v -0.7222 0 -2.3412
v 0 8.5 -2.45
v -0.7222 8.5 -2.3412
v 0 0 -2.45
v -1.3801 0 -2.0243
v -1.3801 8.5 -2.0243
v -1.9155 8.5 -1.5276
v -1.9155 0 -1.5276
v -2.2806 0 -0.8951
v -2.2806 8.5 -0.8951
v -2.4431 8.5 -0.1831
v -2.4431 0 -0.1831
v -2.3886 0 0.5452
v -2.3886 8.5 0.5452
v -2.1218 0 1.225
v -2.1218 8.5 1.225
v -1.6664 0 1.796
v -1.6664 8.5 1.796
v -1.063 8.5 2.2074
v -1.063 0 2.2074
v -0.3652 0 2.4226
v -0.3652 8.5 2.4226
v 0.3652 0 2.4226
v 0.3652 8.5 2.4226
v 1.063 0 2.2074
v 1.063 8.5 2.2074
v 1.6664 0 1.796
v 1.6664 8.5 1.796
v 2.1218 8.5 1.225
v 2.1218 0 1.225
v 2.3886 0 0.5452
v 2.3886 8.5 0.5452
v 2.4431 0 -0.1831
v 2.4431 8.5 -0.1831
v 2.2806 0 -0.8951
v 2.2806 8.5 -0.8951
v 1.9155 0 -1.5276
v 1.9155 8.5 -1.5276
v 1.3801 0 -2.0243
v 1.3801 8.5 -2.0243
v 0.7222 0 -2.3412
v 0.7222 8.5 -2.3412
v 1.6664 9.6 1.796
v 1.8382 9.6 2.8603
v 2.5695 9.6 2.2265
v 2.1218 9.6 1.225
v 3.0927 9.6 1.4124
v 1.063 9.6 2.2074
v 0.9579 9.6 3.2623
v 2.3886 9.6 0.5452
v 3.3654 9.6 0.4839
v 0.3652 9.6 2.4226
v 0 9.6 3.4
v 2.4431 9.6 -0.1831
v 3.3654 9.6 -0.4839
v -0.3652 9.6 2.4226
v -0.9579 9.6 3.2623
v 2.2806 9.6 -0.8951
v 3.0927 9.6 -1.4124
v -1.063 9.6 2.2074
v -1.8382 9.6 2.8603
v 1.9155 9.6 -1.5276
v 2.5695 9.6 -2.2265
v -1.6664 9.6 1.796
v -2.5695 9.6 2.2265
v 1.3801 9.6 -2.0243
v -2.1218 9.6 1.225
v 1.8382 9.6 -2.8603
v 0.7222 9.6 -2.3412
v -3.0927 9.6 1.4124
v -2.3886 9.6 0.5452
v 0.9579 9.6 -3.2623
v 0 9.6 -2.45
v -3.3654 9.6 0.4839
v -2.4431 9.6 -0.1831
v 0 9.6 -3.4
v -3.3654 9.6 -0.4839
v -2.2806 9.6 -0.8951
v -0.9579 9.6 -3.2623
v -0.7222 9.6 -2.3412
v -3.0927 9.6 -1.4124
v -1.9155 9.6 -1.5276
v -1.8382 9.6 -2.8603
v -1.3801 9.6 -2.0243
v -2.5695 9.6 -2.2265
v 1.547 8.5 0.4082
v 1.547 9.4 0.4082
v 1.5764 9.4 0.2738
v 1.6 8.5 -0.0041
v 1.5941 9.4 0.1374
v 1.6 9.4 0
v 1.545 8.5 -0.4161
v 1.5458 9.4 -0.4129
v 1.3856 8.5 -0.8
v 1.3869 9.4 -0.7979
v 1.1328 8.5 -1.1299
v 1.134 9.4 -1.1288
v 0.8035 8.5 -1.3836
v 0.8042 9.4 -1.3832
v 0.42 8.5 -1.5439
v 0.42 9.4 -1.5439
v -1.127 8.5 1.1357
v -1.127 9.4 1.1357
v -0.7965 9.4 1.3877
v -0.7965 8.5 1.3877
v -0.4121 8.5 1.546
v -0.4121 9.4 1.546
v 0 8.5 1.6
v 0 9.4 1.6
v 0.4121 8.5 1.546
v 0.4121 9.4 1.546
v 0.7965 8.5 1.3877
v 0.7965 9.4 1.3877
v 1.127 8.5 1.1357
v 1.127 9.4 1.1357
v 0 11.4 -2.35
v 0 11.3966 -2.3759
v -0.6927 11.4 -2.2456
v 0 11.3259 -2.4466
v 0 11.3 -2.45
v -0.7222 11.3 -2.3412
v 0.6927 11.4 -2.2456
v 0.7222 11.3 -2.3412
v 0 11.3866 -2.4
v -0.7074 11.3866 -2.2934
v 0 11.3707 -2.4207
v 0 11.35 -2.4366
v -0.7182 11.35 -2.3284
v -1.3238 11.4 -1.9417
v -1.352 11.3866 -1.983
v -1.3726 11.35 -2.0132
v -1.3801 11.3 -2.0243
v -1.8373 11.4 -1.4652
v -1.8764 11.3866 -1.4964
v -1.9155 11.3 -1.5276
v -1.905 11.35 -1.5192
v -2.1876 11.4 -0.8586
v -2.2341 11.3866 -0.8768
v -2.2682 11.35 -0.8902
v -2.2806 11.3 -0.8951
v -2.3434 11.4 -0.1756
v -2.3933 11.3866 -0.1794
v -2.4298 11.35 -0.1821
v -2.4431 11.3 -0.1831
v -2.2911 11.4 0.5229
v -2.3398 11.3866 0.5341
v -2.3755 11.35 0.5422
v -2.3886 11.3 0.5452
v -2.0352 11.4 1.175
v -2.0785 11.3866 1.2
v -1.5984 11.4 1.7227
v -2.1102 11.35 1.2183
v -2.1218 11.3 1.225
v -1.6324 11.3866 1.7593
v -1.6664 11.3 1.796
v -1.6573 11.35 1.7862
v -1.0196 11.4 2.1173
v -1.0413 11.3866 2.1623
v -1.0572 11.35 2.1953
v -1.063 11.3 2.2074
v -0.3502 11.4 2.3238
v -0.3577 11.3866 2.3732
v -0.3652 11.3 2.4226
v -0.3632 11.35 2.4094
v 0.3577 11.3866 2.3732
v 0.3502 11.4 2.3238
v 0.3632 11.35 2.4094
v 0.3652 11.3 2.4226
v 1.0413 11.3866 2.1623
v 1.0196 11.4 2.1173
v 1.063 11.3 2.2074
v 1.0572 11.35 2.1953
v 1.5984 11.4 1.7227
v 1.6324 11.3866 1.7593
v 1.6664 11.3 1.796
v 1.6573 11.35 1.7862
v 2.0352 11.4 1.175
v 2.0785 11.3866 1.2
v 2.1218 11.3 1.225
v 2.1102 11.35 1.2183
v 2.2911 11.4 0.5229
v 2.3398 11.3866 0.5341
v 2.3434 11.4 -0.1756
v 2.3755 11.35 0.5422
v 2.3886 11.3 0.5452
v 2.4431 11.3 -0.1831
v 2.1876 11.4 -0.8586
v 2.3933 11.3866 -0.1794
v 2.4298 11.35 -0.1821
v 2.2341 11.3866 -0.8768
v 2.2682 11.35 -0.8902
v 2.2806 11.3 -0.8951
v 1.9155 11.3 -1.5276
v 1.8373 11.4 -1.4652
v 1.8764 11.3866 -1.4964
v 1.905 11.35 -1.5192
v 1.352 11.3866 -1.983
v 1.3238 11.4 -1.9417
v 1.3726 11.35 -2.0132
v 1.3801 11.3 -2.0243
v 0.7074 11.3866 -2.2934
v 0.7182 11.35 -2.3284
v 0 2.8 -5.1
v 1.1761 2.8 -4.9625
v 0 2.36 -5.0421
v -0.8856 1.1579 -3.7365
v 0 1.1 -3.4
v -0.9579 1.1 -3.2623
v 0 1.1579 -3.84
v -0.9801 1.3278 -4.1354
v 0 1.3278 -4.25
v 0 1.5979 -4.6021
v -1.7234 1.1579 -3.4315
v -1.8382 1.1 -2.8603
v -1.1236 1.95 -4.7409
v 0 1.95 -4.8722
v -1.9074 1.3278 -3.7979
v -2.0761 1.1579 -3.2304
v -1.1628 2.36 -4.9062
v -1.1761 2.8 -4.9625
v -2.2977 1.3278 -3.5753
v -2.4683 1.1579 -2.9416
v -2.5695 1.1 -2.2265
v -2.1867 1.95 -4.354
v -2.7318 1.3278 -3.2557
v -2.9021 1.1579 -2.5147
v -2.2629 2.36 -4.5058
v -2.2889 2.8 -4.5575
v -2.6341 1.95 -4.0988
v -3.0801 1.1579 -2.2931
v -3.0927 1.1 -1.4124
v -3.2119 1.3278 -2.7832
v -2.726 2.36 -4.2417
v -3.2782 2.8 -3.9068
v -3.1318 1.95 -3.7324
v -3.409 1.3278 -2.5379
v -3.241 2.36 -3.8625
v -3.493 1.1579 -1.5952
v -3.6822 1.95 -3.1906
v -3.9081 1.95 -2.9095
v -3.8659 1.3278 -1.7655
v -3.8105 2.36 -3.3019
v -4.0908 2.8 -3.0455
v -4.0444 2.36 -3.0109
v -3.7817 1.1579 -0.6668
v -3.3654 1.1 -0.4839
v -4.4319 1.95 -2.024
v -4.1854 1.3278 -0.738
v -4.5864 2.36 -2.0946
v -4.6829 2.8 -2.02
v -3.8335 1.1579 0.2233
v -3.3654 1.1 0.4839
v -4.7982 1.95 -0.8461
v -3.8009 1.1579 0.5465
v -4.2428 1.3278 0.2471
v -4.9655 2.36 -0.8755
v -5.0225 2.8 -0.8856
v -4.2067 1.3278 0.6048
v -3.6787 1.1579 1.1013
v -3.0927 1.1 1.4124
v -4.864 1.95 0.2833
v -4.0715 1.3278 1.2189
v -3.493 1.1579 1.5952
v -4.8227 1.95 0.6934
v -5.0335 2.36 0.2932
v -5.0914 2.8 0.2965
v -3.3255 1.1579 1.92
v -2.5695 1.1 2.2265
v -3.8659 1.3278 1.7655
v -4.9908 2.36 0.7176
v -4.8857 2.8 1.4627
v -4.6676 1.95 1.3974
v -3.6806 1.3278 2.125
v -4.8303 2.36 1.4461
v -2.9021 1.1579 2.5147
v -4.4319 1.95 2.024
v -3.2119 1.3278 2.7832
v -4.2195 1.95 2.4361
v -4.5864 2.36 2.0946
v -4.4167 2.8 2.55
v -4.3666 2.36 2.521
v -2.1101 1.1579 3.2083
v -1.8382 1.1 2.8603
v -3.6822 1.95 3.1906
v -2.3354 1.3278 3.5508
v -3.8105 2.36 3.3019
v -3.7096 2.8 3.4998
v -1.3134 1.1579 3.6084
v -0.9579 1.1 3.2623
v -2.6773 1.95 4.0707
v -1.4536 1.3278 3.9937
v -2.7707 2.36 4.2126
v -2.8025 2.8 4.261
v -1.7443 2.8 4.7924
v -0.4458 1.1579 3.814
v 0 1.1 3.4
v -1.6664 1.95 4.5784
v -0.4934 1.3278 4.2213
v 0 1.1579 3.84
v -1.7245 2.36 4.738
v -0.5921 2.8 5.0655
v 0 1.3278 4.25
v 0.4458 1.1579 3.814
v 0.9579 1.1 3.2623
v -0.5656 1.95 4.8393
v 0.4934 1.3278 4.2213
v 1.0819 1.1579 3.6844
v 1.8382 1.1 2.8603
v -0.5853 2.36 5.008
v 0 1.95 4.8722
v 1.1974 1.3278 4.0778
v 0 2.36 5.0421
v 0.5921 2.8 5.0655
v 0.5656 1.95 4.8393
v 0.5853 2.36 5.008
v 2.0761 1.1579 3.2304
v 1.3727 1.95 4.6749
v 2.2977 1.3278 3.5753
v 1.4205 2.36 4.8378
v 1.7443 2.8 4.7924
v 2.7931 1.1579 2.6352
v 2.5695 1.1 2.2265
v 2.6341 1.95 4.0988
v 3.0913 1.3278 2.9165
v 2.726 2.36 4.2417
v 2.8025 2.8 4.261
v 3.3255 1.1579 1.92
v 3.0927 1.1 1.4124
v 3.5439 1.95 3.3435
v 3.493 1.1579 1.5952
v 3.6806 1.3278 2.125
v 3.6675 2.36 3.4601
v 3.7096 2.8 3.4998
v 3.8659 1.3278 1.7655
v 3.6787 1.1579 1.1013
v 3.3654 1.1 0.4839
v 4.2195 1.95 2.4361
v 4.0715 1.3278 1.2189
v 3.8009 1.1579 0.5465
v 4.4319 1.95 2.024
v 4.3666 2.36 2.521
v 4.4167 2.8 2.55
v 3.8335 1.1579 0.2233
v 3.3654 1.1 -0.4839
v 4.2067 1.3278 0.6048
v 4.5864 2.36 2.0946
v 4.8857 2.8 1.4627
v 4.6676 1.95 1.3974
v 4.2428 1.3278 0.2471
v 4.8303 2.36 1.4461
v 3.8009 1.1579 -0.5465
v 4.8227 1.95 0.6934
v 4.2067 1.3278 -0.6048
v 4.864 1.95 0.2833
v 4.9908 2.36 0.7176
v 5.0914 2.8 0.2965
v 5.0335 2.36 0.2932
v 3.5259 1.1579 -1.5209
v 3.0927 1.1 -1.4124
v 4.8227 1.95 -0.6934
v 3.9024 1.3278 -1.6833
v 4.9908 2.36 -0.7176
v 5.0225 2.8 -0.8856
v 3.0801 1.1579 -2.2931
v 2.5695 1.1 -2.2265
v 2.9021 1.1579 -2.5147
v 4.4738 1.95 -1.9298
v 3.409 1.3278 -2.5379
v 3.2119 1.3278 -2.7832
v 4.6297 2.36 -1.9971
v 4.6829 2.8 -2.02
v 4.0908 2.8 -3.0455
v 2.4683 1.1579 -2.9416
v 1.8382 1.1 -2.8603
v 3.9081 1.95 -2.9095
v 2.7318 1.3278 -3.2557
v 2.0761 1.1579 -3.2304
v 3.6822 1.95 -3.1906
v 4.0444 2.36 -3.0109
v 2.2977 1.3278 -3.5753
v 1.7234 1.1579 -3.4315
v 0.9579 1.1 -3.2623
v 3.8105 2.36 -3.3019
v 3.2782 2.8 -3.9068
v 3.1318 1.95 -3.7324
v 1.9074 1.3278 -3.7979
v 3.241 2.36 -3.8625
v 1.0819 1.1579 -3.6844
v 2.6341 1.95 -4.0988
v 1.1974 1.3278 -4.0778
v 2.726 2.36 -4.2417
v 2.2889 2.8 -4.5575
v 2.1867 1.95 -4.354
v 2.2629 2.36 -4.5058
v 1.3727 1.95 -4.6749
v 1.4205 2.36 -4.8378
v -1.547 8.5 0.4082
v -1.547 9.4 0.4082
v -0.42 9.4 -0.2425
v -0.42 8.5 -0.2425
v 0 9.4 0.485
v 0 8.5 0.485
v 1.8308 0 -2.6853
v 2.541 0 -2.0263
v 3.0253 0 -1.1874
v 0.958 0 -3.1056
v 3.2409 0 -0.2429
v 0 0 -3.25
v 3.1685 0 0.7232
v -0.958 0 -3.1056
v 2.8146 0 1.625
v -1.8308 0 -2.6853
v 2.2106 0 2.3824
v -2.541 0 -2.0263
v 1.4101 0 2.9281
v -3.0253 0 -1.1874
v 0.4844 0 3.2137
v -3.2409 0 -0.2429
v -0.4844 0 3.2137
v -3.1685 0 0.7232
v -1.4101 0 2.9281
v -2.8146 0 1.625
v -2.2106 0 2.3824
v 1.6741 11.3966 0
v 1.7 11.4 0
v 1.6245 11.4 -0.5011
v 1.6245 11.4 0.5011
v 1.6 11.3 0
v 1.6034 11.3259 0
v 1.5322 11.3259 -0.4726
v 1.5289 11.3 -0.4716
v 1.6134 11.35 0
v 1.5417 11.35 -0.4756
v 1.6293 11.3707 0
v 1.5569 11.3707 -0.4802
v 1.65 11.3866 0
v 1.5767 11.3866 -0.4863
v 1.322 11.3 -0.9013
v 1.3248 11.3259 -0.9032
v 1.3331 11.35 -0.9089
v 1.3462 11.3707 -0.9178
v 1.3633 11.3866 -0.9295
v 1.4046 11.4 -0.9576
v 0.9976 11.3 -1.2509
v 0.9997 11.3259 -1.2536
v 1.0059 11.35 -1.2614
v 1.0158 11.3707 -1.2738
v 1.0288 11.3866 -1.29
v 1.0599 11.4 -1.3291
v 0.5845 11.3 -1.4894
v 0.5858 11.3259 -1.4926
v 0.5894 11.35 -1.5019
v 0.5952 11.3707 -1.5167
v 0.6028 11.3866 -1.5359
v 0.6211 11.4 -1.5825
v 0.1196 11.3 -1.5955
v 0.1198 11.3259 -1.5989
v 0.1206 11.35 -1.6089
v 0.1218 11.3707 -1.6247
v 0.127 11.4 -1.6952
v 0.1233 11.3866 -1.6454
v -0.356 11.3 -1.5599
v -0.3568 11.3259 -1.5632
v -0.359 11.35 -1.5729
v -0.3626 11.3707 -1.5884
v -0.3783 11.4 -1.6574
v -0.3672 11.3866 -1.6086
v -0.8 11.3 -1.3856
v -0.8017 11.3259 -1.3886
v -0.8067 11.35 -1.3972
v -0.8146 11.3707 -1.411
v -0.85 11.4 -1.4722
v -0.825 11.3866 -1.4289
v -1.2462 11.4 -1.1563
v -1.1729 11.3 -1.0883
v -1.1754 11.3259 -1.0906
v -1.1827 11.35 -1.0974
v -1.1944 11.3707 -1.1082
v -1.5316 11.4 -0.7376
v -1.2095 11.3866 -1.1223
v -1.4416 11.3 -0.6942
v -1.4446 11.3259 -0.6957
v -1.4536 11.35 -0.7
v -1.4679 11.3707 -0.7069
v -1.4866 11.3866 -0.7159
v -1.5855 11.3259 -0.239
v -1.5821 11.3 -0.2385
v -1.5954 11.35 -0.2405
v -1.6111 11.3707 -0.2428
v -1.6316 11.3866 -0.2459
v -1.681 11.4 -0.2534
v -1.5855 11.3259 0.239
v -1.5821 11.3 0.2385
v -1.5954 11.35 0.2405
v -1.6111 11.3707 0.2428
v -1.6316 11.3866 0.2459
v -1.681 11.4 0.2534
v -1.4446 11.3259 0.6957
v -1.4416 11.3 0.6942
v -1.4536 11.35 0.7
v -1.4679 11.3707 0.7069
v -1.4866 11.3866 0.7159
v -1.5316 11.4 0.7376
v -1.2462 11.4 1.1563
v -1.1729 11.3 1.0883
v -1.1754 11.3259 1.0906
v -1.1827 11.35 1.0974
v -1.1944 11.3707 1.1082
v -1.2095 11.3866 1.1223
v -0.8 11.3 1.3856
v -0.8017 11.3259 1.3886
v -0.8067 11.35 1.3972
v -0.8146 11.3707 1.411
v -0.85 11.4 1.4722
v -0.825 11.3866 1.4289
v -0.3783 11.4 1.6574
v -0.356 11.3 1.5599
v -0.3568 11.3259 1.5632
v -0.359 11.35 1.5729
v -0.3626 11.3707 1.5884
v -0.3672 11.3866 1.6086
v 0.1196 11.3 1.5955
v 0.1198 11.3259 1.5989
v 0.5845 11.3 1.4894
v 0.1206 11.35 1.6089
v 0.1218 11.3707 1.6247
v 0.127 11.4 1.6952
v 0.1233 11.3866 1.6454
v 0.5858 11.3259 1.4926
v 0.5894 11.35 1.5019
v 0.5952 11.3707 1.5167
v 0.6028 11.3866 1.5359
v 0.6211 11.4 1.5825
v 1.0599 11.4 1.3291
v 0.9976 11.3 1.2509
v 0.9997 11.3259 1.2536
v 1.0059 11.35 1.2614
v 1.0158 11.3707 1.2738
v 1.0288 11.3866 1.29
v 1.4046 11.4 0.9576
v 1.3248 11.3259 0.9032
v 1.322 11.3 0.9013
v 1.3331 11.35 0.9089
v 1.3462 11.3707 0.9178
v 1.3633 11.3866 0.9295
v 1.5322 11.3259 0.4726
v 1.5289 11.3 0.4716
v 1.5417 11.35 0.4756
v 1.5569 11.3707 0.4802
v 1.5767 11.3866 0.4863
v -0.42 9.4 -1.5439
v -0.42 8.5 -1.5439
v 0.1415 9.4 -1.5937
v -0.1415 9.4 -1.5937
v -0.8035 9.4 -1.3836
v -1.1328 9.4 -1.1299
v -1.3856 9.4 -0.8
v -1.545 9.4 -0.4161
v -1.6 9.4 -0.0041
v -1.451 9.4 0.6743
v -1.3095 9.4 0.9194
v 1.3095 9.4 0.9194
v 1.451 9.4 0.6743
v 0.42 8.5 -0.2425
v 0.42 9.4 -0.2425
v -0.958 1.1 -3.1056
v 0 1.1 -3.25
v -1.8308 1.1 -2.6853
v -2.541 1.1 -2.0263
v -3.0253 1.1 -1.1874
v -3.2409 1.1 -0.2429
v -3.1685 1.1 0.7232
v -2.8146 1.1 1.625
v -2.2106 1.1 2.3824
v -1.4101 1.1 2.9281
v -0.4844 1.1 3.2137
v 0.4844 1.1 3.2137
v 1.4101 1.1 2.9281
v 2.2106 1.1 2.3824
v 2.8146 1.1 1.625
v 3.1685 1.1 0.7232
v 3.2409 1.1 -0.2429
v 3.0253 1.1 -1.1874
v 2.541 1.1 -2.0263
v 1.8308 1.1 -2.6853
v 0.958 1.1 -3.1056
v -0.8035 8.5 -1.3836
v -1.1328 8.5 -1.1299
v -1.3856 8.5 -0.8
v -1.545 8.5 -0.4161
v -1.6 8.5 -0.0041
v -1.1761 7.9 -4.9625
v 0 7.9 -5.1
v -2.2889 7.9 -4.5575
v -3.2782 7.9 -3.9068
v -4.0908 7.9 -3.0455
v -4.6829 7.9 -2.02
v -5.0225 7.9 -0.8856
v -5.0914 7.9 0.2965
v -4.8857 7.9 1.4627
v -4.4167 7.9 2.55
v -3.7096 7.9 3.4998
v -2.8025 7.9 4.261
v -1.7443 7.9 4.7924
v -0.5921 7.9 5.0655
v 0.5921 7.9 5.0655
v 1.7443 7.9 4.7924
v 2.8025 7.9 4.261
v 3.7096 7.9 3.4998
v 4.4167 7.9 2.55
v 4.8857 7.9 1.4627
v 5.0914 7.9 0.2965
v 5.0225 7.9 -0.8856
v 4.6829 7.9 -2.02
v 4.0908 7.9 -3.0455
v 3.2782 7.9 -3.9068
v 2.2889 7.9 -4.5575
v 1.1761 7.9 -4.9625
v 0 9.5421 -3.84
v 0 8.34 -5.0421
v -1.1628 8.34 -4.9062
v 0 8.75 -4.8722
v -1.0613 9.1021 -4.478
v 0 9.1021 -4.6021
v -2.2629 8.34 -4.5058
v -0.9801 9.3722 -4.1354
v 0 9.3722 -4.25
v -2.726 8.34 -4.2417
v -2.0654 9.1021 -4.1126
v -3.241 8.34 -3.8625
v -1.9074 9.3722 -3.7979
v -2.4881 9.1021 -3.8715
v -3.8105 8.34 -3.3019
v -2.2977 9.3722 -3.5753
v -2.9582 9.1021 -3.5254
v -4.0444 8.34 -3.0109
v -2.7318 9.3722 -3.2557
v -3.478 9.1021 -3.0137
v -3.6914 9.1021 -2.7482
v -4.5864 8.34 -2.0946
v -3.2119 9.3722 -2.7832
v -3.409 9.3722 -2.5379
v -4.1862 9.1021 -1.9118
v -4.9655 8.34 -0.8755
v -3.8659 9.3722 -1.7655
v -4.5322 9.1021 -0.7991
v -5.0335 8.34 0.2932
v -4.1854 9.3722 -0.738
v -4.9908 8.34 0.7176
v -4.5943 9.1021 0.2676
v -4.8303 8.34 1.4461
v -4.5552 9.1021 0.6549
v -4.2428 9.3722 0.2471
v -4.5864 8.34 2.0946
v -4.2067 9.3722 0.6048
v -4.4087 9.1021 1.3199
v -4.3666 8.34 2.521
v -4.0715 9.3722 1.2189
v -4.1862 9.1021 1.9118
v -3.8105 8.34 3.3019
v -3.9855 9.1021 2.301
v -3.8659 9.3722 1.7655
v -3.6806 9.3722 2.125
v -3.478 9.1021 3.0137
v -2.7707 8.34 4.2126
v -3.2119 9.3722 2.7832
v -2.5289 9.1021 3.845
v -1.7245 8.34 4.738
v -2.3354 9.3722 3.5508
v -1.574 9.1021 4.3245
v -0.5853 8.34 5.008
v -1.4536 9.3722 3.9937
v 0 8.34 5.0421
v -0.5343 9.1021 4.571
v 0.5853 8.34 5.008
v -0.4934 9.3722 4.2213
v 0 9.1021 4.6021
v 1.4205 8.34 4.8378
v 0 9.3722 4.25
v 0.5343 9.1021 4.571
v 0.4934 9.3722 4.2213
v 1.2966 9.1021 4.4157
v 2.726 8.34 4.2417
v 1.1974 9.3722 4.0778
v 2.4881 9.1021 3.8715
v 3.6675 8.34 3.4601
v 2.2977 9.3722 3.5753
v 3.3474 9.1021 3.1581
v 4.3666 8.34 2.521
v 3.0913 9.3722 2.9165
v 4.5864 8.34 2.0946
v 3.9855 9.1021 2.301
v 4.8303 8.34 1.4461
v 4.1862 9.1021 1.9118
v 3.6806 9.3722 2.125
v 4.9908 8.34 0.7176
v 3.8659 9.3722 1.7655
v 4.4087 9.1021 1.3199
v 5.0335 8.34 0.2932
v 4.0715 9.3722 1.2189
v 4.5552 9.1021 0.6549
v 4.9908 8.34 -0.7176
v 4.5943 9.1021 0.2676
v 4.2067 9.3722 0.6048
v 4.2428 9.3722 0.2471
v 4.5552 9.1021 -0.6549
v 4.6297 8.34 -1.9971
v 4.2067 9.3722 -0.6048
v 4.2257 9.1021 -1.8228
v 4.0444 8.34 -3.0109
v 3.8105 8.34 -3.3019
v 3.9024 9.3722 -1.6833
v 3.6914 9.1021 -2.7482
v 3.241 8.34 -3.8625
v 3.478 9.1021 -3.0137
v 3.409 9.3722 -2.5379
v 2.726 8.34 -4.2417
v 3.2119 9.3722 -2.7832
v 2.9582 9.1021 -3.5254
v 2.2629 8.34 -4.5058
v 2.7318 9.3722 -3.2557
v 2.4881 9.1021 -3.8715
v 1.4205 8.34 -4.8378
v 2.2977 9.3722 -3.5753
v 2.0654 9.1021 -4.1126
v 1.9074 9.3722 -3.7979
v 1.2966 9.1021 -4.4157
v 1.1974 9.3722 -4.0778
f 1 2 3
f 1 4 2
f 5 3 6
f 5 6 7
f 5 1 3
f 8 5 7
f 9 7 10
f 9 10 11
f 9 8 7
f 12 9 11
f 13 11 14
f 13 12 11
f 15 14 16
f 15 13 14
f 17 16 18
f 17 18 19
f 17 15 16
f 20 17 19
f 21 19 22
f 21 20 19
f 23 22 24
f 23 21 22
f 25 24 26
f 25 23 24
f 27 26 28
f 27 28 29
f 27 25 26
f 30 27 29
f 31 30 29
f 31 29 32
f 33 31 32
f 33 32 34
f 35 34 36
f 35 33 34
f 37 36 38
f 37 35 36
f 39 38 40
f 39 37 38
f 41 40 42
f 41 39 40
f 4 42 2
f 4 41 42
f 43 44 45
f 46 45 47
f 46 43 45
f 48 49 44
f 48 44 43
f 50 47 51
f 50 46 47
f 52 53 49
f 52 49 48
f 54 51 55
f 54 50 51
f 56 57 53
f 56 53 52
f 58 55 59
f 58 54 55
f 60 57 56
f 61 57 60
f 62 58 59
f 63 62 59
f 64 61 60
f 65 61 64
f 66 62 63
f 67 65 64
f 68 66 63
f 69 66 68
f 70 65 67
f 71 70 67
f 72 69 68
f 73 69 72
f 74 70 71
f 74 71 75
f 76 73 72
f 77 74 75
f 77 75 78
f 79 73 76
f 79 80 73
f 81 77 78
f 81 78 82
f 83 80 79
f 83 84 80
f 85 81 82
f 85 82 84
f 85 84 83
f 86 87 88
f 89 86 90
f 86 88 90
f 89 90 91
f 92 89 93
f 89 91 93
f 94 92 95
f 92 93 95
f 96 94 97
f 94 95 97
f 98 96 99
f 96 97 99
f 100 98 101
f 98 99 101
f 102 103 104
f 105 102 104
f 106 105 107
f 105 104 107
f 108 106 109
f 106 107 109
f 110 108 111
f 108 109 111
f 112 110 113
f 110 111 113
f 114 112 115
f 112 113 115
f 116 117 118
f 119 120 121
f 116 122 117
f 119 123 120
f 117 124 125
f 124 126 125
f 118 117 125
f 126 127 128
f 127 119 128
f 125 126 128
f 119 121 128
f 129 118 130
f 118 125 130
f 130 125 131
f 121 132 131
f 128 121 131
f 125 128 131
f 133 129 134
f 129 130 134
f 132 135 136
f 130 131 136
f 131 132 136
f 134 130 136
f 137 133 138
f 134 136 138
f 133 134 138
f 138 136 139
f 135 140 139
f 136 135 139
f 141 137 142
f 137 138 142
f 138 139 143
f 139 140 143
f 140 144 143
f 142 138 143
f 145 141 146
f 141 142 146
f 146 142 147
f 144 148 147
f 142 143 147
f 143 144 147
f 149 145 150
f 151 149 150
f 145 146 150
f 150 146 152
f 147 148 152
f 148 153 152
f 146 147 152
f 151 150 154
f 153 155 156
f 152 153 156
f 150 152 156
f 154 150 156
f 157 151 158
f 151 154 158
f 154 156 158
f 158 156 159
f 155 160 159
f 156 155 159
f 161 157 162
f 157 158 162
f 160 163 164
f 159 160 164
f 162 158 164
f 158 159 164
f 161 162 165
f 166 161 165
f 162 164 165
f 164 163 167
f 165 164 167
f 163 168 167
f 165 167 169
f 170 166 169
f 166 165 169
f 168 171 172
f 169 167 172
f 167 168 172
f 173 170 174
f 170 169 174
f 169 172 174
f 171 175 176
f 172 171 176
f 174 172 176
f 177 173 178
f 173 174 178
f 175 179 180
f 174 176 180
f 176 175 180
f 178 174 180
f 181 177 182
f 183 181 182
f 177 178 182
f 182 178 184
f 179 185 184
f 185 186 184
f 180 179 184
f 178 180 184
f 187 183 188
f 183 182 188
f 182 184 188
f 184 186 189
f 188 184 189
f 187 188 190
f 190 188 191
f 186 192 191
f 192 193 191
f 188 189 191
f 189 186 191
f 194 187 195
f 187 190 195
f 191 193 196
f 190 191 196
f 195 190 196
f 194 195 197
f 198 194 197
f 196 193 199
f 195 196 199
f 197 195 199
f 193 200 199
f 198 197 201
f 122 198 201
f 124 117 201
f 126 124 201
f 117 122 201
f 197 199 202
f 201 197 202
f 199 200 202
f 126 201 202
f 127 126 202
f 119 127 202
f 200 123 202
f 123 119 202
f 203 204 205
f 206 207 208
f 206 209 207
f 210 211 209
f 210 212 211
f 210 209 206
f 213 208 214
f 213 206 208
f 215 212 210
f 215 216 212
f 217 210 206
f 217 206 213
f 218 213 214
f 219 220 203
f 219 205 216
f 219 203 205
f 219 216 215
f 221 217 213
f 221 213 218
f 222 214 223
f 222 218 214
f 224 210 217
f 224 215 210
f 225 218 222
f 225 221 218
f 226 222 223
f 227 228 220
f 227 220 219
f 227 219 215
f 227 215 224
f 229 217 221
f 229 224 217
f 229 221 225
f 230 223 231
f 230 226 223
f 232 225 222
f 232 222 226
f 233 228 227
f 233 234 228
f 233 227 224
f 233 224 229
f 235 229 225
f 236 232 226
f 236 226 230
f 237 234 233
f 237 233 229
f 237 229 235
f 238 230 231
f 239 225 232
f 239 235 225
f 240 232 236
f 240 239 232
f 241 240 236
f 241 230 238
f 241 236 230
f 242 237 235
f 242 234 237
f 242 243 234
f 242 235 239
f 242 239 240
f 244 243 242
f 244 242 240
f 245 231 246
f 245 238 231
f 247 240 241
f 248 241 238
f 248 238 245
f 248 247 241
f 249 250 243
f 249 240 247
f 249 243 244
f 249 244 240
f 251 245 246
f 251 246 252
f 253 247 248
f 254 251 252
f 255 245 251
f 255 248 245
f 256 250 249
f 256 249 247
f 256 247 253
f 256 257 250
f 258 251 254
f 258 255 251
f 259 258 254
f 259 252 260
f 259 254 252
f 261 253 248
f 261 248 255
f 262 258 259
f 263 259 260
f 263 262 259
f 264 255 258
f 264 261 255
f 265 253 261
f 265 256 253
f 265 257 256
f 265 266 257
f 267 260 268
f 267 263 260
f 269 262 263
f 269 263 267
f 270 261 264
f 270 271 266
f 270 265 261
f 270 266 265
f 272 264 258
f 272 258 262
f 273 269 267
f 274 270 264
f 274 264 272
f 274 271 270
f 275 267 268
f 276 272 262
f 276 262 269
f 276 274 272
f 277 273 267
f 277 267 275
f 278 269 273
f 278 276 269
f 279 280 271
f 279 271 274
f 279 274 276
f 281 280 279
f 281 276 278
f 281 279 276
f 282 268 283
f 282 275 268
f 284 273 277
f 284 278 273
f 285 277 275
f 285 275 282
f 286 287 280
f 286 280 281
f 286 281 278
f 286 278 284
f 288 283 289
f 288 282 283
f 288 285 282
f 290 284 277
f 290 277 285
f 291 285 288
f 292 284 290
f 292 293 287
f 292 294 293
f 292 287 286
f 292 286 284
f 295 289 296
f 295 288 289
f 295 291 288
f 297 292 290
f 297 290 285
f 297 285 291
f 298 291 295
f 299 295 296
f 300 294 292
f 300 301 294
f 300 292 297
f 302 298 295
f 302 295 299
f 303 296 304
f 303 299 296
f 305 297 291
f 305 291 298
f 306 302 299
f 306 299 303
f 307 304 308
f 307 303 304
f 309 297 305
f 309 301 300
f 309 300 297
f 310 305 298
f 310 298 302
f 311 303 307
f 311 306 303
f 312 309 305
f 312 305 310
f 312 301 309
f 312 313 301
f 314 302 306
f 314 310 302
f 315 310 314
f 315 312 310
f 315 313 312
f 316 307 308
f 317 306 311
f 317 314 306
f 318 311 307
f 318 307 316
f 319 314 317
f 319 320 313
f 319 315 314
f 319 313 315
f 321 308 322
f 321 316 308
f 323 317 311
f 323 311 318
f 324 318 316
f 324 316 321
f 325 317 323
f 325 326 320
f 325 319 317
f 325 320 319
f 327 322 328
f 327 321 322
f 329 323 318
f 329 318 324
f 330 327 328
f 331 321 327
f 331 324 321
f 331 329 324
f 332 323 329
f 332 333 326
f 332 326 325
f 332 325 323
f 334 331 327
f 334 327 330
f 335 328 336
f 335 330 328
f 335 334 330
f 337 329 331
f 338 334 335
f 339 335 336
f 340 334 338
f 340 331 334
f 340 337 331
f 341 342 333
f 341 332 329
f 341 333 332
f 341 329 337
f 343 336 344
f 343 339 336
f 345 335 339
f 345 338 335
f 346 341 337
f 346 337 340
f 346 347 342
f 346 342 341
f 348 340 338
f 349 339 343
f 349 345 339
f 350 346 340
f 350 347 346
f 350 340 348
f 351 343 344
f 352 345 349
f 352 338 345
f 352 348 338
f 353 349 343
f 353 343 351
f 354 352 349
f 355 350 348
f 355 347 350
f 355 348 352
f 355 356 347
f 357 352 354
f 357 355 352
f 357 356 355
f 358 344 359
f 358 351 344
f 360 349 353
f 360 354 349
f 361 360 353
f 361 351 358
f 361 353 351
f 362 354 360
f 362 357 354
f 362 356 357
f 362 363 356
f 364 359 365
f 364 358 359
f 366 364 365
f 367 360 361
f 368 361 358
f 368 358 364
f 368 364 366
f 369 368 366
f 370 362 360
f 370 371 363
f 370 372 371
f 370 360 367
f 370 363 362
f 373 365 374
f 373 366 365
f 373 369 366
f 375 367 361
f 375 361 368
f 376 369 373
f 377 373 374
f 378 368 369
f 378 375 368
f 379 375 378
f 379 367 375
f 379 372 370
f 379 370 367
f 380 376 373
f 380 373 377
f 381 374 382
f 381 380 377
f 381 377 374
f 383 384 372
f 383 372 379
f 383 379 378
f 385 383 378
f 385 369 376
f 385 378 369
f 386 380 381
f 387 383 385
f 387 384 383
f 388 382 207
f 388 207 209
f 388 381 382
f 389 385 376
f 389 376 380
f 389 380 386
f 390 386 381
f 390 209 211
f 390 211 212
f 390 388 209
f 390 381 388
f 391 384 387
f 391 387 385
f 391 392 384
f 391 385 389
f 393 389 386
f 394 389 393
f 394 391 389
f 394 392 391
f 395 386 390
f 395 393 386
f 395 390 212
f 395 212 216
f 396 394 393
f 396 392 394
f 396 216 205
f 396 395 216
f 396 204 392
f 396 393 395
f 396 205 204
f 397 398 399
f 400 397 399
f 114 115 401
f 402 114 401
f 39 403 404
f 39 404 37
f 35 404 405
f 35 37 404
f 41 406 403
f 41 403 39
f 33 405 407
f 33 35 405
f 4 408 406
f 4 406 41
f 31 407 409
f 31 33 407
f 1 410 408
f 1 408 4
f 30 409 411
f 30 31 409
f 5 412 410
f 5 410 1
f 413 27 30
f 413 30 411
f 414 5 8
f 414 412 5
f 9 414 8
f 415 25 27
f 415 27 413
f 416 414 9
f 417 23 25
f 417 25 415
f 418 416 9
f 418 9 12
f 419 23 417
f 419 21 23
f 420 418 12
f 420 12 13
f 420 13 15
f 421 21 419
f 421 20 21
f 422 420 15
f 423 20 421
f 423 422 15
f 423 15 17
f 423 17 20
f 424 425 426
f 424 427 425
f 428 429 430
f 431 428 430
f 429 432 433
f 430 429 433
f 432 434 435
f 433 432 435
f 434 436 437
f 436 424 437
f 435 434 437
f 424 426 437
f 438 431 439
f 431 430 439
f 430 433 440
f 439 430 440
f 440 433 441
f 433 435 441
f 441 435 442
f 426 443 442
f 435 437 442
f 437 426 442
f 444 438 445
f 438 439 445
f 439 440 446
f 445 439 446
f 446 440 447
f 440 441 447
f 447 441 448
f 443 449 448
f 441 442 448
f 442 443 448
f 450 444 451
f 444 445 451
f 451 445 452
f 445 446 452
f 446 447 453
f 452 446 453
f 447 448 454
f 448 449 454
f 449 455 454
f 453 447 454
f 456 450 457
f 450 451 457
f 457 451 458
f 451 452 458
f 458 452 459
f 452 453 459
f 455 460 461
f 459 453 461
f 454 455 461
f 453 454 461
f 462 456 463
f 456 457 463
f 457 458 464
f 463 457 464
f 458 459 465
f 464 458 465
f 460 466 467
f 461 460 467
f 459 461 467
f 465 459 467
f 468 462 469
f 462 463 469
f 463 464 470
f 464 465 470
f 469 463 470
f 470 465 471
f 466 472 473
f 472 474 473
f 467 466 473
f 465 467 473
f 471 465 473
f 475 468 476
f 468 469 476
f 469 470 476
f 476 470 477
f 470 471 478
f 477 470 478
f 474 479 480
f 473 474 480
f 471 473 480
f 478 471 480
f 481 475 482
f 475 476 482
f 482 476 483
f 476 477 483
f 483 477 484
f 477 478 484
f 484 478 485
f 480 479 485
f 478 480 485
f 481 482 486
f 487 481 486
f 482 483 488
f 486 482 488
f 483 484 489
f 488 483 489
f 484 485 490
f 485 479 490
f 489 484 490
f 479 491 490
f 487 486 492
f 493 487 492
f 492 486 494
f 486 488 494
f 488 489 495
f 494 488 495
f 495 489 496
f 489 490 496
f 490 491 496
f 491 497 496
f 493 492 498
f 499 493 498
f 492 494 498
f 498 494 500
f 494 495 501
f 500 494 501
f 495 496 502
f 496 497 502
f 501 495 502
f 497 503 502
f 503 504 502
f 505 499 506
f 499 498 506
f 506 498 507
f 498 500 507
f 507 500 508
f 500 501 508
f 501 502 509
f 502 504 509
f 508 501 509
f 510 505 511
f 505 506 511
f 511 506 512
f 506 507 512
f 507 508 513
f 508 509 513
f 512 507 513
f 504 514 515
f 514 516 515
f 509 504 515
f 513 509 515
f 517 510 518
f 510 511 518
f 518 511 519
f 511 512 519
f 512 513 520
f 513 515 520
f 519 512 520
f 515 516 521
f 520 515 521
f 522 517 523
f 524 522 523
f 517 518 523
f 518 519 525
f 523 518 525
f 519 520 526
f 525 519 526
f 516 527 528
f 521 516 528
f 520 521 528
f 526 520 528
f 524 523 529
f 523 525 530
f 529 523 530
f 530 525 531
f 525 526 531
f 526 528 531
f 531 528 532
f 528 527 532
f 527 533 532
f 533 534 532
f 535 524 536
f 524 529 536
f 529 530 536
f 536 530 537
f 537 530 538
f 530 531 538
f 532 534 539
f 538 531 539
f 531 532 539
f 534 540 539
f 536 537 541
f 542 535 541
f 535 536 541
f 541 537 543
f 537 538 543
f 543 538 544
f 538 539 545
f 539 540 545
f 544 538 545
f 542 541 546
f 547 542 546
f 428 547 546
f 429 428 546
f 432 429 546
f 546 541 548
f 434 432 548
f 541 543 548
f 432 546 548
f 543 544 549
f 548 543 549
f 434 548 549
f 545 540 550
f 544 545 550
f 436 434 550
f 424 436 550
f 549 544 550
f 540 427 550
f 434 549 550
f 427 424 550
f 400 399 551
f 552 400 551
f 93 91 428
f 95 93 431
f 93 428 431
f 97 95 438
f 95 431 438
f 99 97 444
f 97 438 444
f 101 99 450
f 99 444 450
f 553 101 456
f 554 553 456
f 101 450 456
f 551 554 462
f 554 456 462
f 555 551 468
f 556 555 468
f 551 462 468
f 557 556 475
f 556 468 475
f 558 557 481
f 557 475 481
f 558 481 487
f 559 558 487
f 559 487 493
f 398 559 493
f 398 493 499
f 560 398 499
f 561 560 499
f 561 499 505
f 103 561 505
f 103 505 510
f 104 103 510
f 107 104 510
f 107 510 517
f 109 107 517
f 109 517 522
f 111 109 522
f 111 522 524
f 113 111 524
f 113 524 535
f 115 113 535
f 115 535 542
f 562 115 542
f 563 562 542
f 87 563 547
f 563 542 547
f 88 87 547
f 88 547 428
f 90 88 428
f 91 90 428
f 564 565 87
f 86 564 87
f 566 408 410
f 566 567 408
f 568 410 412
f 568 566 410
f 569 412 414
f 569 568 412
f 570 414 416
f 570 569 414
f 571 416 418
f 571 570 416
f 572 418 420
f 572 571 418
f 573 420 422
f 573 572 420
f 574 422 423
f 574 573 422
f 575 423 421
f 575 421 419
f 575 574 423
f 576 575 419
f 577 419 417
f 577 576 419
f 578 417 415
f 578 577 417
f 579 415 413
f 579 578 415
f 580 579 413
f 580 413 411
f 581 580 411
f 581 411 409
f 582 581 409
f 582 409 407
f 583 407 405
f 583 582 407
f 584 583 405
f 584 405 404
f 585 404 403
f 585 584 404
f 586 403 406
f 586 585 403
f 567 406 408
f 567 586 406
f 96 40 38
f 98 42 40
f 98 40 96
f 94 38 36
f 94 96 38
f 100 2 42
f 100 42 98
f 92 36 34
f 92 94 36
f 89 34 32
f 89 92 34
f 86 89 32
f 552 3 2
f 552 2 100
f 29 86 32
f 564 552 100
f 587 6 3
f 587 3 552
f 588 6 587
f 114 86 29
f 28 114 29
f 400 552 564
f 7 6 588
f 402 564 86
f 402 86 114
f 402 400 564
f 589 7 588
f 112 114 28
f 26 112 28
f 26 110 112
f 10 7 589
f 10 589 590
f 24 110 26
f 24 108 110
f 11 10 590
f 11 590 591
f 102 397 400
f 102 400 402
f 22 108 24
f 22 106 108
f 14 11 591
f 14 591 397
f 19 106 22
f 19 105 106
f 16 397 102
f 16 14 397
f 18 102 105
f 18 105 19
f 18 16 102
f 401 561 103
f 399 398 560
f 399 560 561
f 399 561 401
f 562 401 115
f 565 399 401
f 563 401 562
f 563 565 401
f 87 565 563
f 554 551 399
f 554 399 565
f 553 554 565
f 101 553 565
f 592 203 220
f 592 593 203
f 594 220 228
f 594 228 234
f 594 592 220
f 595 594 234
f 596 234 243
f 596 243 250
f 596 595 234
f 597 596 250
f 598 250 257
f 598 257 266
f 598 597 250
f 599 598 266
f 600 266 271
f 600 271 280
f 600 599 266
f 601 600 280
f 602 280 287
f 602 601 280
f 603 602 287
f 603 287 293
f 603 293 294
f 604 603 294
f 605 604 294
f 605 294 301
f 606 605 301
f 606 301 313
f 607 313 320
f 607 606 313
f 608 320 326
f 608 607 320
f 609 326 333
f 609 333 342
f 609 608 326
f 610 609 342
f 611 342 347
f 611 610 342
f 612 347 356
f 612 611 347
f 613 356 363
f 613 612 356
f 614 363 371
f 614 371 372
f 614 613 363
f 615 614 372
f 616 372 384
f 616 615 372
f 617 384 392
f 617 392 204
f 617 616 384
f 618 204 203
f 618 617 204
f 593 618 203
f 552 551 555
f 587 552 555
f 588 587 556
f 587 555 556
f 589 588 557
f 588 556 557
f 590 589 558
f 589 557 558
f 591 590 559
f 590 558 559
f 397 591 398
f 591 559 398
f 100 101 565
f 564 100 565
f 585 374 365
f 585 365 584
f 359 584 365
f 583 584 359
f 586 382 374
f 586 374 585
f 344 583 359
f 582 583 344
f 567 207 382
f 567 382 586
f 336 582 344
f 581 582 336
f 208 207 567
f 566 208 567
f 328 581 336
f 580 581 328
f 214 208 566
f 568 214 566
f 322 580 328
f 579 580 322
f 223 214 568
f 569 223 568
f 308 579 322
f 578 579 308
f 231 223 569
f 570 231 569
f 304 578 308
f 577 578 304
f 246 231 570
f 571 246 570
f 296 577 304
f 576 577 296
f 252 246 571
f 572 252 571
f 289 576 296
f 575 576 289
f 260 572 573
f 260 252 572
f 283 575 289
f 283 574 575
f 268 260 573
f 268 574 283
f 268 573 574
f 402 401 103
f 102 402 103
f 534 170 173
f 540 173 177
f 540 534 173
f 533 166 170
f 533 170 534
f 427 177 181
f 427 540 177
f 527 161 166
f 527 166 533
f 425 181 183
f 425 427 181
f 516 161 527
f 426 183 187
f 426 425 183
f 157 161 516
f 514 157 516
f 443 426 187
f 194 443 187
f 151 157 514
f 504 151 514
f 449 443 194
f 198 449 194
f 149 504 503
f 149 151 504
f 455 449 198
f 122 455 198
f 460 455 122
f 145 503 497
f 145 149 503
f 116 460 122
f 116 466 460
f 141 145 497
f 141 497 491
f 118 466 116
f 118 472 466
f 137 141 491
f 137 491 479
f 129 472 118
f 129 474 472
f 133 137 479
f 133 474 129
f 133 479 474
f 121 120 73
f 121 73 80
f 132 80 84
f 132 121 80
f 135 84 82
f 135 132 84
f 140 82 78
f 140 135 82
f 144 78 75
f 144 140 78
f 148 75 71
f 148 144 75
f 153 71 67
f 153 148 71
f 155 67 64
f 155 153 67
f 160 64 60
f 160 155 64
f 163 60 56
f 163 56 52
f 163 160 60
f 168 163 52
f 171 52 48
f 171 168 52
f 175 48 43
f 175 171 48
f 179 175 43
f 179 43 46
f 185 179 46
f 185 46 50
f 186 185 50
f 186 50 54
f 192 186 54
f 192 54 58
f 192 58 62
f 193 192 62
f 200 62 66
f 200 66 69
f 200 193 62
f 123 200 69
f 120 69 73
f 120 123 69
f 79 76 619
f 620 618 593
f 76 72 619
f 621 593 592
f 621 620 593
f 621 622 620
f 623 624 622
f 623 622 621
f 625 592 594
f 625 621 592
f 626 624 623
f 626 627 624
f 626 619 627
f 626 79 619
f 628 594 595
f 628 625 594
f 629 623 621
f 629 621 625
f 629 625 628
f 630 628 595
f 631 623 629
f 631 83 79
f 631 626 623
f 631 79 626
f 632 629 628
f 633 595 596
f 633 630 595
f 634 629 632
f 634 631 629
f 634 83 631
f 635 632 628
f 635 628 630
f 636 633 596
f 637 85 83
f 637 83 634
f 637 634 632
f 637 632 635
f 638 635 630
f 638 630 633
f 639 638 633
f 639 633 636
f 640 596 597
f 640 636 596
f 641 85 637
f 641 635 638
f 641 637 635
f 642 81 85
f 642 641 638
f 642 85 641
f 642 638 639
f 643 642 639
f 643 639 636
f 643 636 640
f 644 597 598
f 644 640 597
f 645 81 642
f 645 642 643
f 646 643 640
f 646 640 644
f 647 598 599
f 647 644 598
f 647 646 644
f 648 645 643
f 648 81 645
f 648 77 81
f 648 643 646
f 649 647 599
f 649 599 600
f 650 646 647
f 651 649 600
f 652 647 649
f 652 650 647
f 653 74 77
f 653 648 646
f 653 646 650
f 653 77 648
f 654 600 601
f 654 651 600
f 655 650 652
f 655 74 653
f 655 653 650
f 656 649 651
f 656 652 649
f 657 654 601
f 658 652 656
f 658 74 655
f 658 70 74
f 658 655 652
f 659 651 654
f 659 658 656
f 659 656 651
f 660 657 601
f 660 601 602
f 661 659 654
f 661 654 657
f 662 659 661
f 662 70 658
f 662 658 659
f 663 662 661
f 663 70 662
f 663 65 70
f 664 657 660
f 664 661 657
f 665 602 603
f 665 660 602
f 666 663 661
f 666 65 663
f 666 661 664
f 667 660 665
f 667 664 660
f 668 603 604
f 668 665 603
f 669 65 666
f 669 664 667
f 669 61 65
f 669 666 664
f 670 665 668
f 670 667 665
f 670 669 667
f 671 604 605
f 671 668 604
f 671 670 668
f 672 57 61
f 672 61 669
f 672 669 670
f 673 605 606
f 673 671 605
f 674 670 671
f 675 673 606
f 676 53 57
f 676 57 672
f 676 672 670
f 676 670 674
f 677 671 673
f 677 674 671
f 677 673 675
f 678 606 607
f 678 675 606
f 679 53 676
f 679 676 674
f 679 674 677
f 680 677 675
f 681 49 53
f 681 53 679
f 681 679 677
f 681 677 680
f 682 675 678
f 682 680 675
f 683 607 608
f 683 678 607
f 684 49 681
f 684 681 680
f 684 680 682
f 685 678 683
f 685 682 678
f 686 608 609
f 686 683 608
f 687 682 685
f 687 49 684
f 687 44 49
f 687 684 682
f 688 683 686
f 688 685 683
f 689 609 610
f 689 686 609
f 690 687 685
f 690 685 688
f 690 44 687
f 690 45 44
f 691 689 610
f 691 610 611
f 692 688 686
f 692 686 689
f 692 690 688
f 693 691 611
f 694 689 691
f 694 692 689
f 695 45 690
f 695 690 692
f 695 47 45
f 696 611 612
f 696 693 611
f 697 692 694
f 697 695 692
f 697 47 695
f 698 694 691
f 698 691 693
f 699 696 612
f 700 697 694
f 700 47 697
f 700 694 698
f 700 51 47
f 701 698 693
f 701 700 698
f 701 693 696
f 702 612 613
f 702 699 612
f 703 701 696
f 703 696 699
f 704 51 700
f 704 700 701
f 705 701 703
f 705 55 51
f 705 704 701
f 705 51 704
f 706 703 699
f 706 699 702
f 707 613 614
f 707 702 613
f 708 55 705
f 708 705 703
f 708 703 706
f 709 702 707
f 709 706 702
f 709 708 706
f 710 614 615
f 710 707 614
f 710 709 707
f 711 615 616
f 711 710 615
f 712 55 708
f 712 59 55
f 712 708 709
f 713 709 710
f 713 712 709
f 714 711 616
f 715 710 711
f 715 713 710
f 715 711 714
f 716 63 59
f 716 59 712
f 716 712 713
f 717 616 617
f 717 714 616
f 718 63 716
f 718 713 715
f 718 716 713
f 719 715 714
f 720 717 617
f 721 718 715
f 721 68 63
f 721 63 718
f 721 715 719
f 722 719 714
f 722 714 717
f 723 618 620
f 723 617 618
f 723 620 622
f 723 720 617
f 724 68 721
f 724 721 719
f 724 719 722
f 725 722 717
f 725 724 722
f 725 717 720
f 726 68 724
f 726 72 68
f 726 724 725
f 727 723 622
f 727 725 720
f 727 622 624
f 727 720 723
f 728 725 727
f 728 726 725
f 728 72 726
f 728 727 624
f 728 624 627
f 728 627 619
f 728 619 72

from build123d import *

# Parameters (mm, degrees)
CROQUIS3_R            = 1.6
CORTAR_EXTRUIR1_DEPTH = 2
CORTAR_EXTRUIR2_DEPTH = 0.9
MATRIZC1_COUNT        = 3
REDONDEO1_R           = 0.1


with BuildPart() as part:
    # Croquis1 → Revolución1 (revolve)
    with BuildSketch(Plane(origin=(0, 0, 0), x_dir=(0, 0, -1), z_dir=(1, 0, 0))):
        with BuildLine():
            Line((2.45, 0), (3.25, 0))
            Line((3.25, 0), (3.25, 1.1))
            Line((3.25, 1.1), (3.4, 1.1))
            ThreePointArc((3.4, 1.1), (4.602082, 1.597918), (5.1, 2.8))
            Line((5.1, 2.8), (5.1, 7.9))
            ThreePointArc((5.1, 7.9), (4.602082, 9.102082), (3.4, 9.6))
            Line((3.4, 9.6), (2.45, 9.6))
            Line((2.45, 9.6), (2.45, 11.4))
            Line((2.45, 11.4), (0, 11.4))
            Line((0, 11.4), (0, 8.5))
            Line((0, 8.5), (2.45, 8.5))
            Line((2.45, 8.5), (2.45, 0))
        make_face()
    revolve(axis=Axis((0, 0, 0), (0, 1, 0)))

    # Croquis3 → Cortar-Extruir1 (cut)
    with BuildSketch(Plane(origin=(0, 11.4, 0), x_dir=(1, 0, 0), z_dir=(0, 1, 0))):
        Circle(CROQUIS3_R)
    extrude(amount=-CORTAR_EXTRUIR1_DEPTH, mode=Mode.SUBTRACT)

    # Croquis4 → Cortar-Extruir2 (cut)
    with BuildSketch(Plane(origin=(0, 9.4, 0), x_dir=(1, 0, 0), z_dir=(0, 1, 0))):
        with BuildLine():
            Line((-1.547049, -0.408215), (-0.42, 0.242487))
            Line((-0.42, 0.242487), (-0.42, 1.543891))
            ThreePointArc((-0.42, 1.543891), (-1.385641, 0.8), (-1.547049, -0.408215))
        make_face()
    cortar_extruir2 = extrude(amount=-CORTAR_EXTRUIR2_DEPTH, mode=Mode.SUBTRACT)

    # MatrizC1: Cortar-Extruir2 ×3 about axis
    matrizc1_axis = Axis((0, 0, 0), (0, 1, 0))
    for i in range(1, MATRIZC1_COUNT):
        add(cortar_extruir2.rotate(matrizc1_axis, i * 360 / MATRIZC1_COUNT), mode=Mode.SUBTRACT)

    # Redondeo1
    redondeo1_edges = [part.edges().sort_by_distance(p)[0] for p in [
        (-1.6, 11.4, 0),
        (0, 11.4, 2.45),
    ]]
    fillet(redondeo1_edges, radius=REDONDEO1_R)


solid = part.part
